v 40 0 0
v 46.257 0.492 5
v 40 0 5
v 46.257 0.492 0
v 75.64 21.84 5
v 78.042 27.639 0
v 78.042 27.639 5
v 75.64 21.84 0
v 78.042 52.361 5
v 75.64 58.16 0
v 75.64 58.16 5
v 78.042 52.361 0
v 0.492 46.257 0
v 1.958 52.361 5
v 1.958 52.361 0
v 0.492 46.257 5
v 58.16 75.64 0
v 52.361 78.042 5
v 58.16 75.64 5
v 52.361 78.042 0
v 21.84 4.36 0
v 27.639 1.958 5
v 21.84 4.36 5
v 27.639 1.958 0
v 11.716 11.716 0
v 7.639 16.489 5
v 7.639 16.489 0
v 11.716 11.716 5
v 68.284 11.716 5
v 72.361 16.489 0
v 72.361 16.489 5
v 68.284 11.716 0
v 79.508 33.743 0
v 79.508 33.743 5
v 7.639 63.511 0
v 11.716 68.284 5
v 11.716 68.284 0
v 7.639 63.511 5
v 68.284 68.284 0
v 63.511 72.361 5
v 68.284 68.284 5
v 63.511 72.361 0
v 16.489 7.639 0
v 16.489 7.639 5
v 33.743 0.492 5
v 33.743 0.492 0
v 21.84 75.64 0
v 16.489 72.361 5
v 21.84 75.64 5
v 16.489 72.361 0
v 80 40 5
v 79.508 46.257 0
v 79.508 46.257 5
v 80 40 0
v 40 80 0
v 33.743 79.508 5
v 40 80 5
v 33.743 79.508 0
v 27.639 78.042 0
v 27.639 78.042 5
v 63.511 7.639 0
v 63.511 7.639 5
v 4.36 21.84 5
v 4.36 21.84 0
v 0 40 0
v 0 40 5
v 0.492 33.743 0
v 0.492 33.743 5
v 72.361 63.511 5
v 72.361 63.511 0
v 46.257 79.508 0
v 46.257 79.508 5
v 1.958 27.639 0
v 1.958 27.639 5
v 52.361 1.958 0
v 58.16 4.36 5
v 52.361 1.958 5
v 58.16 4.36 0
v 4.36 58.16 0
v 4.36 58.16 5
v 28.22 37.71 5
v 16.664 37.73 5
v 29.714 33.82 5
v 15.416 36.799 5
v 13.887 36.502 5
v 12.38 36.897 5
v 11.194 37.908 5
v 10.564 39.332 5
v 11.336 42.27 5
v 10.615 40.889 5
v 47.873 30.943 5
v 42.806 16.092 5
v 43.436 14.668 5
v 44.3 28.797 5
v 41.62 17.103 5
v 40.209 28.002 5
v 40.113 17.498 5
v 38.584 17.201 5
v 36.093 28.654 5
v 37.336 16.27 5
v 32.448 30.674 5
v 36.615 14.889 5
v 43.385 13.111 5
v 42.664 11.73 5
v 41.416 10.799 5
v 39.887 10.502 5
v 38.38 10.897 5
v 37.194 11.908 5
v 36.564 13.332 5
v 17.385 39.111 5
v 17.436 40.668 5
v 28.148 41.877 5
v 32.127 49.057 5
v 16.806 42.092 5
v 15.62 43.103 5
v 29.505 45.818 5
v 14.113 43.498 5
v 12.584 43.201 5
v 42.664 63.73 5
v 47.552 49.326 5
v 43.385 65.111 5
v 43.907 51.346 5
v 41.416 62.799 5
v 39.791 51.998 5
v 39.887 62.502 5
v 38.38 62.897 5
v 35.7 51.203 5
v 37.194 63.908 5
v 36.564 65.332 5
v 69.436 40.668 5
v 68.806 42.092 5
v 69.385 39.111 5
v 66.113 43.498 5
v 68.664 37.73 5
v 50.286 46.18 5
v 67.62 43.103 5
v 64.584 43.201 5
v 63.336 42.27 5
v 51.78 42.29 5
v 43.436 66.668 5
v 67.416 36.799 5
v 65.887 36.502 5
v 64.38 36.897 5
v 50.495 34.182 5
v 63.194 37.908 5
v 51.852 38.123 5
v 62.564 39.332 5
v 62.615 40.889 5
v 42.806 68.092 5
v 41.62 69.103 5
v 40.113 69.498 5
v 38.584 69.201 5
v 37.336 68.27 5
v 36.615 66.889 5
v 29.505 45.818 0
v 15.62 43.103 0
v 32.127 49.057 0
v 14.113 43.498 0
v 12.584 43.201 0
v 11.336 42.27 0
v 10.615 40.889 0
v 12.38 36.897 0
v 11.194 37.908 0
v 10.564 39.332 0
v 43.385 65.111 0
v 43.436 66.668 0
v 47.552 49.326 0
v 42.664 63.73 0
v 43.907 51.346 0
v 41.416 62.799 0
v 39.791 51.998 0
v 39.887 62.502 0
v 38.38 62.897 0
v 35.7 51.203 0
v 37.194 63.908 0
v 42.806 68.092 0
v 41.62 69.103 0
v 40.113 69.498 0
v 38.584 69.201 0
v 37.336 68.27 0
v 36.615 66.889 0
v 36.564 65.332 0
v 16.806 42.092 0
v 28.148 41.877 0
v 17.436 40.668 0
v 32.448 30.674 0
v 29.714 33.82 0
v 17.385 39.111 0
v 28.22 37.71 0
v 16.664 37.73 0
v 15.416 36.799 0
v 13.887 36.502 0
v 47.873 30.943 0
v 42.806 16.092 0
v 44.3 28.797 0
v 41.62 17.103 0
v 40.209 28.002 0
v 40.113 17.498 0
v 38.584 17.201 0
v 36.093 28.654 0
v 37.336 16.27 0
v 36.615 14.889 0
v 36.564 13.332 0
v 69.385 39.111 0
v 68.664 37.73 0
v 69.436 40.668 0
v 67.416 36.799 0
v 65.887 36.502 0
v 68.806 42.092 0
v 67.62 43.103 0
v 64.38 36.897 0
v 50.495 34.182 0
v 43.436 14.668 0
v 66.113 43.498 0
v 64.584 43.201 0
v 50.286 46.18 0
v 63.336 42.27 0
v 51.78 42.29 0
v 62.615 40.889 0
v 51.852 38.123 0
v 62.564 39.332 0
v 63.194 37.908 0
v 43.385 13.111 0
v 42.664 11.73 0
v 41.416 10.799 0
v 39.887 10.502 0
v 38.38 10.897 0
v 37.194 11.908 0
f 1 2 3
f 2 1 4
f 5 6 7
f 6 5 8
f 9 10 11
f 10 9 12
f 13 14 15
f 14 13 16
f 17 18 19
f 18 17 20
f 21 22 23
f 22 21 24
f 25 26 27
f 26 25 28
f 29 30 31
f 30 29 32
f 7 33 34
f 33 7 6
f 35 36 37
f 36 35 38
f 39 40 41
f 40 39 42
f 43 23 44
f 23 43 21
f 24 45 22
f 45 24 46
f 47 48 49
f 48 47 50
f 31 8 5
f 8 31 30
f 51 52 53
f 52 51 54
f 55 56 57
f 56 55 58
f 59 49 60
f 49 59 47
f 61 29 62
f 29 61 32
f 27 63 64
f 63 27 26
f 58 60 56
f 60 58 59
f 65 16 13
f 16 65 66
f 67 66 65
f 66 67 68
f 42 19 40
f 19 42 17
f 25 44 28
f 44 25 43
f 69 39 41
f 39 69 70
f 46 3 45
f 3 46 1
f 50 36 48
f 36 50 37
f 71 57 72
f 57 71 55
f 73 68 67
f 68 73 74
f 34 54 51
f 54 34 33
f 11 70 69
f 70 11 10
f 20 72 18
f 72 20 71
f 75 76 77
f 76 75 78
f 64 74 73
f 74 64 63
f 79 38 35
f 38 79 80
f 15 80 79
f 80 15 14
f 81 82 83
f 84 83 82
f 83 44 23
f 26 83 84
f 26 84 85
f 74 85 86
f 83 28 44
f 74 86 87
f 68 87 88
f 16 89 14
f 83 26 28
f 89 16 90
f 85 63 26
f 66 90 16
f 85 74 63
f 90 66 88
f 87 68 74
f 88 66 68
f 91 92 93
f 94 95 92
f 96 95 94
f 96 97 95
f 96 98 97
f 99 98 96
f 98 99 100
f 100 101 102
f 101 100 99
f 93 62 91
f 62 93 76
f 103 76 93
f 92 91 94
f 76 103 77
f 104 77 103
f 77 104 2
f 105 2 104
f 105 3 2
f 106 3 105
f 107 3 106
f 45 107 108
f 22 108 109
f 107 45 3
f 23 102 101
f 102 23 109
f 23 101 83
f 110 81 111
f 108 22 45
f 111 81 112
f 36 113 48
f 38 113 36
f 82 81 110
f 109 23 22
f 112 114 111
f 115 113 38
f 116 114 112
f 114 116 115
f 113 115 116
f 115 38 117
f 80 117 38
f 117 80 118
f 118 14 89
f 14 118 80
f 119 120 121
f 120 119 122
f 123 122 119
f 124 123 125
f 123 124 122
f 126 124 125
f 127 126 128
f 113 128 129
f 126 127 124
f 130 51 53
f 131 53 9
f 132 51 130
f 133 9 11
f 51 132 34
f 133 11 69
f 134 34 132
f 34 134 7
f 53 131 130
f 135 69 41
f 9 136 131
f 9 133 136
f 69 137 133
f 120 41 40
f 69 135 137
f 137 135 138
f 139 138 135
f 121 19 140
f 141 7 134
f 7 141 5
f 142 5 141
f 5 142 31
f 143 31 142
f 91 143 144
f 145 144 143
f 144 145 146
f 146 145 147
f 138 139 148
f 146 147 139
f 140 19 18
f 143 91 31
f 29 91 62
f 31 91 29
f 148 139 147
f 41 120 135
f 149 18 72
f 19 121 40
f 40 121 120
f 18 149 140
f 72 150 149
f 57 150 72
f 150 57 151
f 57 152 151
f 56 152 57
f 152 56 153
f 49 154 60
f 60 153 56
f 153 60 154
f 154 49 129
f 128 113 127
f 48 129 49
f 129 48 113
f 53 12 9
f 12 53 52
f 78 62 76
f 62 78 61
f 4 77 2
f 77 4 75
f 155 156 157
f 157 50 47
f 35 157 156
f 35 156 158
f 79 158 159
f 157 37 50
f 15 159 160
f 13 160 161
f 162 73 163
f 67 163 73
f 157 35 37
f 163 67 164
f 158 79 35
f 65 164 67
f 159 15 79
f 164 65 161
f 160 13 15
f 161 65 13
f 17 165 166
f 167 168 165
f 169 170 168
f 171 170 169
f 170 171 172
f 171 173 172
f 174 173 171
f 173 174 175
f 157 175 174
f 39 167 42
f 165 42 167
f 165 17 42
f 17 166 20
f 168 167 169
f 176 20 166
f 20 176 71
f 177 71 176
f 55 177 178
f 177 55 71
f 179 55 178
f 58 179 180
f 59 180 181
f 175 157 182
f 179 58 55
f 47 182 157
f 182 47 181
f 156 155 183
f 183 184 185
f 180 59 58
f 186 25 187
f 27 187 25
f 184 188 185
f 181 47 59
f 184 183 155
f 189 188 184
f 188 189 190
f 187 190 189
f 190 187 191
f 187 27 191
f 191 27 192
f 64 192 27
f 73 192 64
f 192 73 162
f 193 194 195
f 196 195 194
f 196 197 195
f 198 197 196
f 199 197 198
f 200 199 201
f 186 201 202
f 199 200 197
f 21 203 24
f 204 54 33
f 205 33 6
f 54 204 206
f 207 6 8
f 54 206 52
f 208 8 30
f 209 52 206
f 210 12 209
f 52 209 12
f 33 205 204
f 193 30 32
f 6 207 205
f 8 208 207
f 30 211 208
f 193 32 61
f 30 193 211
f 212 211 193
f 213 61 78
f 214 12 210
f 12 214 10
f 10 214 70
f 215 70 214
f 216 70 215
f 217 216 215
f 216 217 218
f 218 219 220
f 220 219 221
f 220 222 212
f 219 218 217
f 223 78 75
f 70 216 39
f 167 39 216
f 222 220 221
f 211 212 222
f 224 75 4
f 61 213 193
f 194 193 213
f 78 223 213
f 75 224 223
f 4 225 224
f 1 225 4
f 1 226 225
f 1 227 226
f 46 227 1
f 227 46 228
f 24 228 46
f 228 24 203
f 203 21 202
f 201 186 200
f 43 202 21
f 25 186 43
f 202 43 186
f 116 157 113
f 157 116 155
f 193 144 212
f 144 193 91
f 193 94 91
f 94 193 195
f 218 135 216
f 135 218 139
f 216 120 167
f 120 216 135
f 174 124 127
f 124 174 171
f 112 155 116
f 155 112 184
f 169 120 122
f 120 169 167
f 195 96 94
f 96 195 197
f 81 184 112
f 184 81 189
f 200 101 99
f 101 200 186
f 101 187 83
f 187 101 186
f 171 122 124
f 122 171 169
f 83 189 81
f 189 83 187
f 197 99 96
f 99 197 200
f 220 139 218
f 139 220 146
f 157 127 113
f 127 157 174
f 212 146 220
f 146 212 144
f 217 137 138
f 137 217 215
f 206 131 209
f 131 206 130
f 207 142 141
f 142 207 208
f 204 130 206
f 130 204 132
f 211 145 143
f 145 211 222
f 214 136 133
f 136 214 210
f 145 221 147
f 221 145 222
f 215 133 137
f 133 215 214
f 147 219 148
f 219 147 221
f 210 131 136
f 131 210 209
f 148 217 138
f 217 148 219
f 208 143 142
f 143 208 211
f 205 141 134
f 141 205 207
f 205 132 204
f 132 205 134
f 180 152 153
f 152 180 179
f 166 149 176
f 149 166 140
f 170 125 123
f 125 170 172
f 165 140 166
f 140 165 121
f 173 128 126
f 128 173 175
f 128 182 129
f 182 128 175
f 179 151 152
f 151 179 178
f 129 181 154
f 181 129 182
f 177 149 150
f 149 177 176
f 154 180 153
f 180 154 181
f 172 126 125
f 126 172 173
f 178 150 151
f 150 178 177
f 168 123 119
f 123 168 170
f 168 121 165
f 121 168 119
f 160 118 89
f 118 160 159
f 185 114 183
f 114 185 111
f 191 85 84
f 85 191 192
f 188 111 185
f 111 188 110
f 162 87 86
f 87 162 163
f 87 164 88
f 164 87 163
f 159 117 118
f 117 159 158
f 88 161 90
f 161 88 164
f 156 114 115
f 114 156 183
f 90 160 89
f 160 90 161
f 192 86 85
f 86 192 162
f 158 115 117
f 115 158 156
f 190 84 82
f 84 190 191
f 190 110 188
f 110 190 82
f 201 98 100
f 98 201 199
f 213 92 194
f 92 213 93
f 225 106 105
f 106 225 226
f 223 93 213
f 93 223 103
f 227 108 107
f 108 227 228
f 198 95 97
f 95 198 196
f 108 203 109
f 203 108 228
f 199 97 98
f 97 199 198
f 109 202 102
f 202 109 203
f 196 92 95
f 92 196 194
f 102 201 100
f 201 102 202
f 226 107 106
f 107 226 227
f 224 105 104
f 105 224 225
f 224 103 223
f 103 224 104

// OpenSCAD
$fn = 32;

// ----------------------------------------------------------------------
// Spacer plate: round flange R40, 4 bolts
// ----------------------------------------------------------------------

// --- parameters (mm) ---
bore_r = 12;              // centre bore radius
bolt_r = 3.5;             // bolt hole radius
plate_t = 5;              // plate thickness, Z (extrusion height)
flange_r = 40;            // flange radius
n_bolt = 4;               // bolt hole count
ring_r = 26;              // bolt circle radius

profile = [[80, 40], [79.508, 46.257], [78.042, 52.361], [75.64, 58.16], [72.361, 63.511], [68.284, 68.284], [63.511, 72.361], [58.16, 75.64], [52.361, 78.042], [46.257, 79.508], [40, 80], [33.743, 79.508], [27.639, 78.042], [21.84, 75.64], [16.489, 72.361], [11.716, 68.284], [7.639, 63.511], [4.36, 58.16], [1.958, 52.361], [0.492, 46.257], [0, 40], [0.492, 33.743], [1.958, 27.639], [4.36, 21.84], [7.639, 16.489], [11.716, 11.716], [16.489, 7.639], [21.84, 4.36], [27.639, 1.958], [33.743, 0.492], [40, 0], [46.257, 0.492], [52.361, 1.958], [58.16, 4.36], [63.511, 7.639], [68.284, 11.716], [72.361, 16.489], [75.64, 21.84], [78.042, 27.639], [79.508, 33.743]];  // primary outline, 40 points, counter clockwise
void_1 = [[51.78, 42.29], [50.286, 46.18], [47.552, 49.326], [43.907, 51.346], [39.791, 51.998], [35.7, 51.203], [32.127, 49.057], [29.505, 45.818], [28.148, 41.877], [28.22, 37.71], [29.714, 33.82], [32.448, 30.674], [36.093, 28.654], [40.209, 28.002], [44.3, 28.797], [47.873, 30.943], [50.495, 34.182], [51.852, 38.123]];  // centre bore, 18 points
void_2 = [[69.436, 40.668], [68.806, 42.092], [67.62, 43.103], [66.113, 43.498], [64.584, 43.201], [63.336, 42.27], [62.615, 40.889], [62.564, 39.332], [63.194, 37.908], [64.38, 36.897], [65.887, 36.502], [67.416, 36.799], [68.664, 37.73], [69.385, 39.111]];  // bolt hole 1, 14 points
void_3 = [[43.436, 66.668], [42.806, 68.092], [41.62, 69.103], [40.113, 69.498], [38.584, 69.201], [37.336, 68.27], [36.615, 66.889], [36.564, 65.332], [37.194, 63.908], [38.38, 62.897], [39.887, 62.502], [41.416, 62.799], [42.664, 63.73], [43.385, 65.111]];  // bolt hole 2, 14 points
void_4 = [[17.436, 40.668], [16.806, 42.092], [15.62, 43.103], [14.113, 43.498], [12.584, 43.201], [11.336, 42.27], [10.615, 40.889], [10.564, 39.332], [11.194, 37.908], [12.38, 36.897], [13.887, 36.502], [15.416, 36.799], [16.664, 37.73], [17.385, 39.111]];  // bolt hole 3, 14 points
void_5 = [[43.436, 14.668], [42.806, 16.092], [41.62, 17.103], [40.113, 17.498], [38.584, 17.201], [37.336, 16.27], [36.615, 14.889], [36.564, 13.332], [37.194, 11.908], [38.38, 10.897], [39.887, 10.502], [41.416, 10.799], [42.664, 11.73], [43.385, 13.111]];  // bolt hole 4, 14 points

// --- the one profile operation ---
difference() {
  linear_extrude(height = plate_t) polygon(points = profile);
  translate([0, 0, -1])
    linear_extrude(height = plate_t + 2) polygon(points = void_1);
  translate([0, 0, -1])
    linear_extrude(height = plate_t + 2) polygon(points = void_2);
  translate([0, 0, -1])
    linear_extrude(height = plate_t + 2) polygon(points = void_3);
  translate([0, 0, -1])
    linear_extrude(height = plate_t + 2) polygon(points = void_4);
  translate([0, 0, -1])
    linear_extrude(height = plate_t + 2) polygon(points = void_5);
}
